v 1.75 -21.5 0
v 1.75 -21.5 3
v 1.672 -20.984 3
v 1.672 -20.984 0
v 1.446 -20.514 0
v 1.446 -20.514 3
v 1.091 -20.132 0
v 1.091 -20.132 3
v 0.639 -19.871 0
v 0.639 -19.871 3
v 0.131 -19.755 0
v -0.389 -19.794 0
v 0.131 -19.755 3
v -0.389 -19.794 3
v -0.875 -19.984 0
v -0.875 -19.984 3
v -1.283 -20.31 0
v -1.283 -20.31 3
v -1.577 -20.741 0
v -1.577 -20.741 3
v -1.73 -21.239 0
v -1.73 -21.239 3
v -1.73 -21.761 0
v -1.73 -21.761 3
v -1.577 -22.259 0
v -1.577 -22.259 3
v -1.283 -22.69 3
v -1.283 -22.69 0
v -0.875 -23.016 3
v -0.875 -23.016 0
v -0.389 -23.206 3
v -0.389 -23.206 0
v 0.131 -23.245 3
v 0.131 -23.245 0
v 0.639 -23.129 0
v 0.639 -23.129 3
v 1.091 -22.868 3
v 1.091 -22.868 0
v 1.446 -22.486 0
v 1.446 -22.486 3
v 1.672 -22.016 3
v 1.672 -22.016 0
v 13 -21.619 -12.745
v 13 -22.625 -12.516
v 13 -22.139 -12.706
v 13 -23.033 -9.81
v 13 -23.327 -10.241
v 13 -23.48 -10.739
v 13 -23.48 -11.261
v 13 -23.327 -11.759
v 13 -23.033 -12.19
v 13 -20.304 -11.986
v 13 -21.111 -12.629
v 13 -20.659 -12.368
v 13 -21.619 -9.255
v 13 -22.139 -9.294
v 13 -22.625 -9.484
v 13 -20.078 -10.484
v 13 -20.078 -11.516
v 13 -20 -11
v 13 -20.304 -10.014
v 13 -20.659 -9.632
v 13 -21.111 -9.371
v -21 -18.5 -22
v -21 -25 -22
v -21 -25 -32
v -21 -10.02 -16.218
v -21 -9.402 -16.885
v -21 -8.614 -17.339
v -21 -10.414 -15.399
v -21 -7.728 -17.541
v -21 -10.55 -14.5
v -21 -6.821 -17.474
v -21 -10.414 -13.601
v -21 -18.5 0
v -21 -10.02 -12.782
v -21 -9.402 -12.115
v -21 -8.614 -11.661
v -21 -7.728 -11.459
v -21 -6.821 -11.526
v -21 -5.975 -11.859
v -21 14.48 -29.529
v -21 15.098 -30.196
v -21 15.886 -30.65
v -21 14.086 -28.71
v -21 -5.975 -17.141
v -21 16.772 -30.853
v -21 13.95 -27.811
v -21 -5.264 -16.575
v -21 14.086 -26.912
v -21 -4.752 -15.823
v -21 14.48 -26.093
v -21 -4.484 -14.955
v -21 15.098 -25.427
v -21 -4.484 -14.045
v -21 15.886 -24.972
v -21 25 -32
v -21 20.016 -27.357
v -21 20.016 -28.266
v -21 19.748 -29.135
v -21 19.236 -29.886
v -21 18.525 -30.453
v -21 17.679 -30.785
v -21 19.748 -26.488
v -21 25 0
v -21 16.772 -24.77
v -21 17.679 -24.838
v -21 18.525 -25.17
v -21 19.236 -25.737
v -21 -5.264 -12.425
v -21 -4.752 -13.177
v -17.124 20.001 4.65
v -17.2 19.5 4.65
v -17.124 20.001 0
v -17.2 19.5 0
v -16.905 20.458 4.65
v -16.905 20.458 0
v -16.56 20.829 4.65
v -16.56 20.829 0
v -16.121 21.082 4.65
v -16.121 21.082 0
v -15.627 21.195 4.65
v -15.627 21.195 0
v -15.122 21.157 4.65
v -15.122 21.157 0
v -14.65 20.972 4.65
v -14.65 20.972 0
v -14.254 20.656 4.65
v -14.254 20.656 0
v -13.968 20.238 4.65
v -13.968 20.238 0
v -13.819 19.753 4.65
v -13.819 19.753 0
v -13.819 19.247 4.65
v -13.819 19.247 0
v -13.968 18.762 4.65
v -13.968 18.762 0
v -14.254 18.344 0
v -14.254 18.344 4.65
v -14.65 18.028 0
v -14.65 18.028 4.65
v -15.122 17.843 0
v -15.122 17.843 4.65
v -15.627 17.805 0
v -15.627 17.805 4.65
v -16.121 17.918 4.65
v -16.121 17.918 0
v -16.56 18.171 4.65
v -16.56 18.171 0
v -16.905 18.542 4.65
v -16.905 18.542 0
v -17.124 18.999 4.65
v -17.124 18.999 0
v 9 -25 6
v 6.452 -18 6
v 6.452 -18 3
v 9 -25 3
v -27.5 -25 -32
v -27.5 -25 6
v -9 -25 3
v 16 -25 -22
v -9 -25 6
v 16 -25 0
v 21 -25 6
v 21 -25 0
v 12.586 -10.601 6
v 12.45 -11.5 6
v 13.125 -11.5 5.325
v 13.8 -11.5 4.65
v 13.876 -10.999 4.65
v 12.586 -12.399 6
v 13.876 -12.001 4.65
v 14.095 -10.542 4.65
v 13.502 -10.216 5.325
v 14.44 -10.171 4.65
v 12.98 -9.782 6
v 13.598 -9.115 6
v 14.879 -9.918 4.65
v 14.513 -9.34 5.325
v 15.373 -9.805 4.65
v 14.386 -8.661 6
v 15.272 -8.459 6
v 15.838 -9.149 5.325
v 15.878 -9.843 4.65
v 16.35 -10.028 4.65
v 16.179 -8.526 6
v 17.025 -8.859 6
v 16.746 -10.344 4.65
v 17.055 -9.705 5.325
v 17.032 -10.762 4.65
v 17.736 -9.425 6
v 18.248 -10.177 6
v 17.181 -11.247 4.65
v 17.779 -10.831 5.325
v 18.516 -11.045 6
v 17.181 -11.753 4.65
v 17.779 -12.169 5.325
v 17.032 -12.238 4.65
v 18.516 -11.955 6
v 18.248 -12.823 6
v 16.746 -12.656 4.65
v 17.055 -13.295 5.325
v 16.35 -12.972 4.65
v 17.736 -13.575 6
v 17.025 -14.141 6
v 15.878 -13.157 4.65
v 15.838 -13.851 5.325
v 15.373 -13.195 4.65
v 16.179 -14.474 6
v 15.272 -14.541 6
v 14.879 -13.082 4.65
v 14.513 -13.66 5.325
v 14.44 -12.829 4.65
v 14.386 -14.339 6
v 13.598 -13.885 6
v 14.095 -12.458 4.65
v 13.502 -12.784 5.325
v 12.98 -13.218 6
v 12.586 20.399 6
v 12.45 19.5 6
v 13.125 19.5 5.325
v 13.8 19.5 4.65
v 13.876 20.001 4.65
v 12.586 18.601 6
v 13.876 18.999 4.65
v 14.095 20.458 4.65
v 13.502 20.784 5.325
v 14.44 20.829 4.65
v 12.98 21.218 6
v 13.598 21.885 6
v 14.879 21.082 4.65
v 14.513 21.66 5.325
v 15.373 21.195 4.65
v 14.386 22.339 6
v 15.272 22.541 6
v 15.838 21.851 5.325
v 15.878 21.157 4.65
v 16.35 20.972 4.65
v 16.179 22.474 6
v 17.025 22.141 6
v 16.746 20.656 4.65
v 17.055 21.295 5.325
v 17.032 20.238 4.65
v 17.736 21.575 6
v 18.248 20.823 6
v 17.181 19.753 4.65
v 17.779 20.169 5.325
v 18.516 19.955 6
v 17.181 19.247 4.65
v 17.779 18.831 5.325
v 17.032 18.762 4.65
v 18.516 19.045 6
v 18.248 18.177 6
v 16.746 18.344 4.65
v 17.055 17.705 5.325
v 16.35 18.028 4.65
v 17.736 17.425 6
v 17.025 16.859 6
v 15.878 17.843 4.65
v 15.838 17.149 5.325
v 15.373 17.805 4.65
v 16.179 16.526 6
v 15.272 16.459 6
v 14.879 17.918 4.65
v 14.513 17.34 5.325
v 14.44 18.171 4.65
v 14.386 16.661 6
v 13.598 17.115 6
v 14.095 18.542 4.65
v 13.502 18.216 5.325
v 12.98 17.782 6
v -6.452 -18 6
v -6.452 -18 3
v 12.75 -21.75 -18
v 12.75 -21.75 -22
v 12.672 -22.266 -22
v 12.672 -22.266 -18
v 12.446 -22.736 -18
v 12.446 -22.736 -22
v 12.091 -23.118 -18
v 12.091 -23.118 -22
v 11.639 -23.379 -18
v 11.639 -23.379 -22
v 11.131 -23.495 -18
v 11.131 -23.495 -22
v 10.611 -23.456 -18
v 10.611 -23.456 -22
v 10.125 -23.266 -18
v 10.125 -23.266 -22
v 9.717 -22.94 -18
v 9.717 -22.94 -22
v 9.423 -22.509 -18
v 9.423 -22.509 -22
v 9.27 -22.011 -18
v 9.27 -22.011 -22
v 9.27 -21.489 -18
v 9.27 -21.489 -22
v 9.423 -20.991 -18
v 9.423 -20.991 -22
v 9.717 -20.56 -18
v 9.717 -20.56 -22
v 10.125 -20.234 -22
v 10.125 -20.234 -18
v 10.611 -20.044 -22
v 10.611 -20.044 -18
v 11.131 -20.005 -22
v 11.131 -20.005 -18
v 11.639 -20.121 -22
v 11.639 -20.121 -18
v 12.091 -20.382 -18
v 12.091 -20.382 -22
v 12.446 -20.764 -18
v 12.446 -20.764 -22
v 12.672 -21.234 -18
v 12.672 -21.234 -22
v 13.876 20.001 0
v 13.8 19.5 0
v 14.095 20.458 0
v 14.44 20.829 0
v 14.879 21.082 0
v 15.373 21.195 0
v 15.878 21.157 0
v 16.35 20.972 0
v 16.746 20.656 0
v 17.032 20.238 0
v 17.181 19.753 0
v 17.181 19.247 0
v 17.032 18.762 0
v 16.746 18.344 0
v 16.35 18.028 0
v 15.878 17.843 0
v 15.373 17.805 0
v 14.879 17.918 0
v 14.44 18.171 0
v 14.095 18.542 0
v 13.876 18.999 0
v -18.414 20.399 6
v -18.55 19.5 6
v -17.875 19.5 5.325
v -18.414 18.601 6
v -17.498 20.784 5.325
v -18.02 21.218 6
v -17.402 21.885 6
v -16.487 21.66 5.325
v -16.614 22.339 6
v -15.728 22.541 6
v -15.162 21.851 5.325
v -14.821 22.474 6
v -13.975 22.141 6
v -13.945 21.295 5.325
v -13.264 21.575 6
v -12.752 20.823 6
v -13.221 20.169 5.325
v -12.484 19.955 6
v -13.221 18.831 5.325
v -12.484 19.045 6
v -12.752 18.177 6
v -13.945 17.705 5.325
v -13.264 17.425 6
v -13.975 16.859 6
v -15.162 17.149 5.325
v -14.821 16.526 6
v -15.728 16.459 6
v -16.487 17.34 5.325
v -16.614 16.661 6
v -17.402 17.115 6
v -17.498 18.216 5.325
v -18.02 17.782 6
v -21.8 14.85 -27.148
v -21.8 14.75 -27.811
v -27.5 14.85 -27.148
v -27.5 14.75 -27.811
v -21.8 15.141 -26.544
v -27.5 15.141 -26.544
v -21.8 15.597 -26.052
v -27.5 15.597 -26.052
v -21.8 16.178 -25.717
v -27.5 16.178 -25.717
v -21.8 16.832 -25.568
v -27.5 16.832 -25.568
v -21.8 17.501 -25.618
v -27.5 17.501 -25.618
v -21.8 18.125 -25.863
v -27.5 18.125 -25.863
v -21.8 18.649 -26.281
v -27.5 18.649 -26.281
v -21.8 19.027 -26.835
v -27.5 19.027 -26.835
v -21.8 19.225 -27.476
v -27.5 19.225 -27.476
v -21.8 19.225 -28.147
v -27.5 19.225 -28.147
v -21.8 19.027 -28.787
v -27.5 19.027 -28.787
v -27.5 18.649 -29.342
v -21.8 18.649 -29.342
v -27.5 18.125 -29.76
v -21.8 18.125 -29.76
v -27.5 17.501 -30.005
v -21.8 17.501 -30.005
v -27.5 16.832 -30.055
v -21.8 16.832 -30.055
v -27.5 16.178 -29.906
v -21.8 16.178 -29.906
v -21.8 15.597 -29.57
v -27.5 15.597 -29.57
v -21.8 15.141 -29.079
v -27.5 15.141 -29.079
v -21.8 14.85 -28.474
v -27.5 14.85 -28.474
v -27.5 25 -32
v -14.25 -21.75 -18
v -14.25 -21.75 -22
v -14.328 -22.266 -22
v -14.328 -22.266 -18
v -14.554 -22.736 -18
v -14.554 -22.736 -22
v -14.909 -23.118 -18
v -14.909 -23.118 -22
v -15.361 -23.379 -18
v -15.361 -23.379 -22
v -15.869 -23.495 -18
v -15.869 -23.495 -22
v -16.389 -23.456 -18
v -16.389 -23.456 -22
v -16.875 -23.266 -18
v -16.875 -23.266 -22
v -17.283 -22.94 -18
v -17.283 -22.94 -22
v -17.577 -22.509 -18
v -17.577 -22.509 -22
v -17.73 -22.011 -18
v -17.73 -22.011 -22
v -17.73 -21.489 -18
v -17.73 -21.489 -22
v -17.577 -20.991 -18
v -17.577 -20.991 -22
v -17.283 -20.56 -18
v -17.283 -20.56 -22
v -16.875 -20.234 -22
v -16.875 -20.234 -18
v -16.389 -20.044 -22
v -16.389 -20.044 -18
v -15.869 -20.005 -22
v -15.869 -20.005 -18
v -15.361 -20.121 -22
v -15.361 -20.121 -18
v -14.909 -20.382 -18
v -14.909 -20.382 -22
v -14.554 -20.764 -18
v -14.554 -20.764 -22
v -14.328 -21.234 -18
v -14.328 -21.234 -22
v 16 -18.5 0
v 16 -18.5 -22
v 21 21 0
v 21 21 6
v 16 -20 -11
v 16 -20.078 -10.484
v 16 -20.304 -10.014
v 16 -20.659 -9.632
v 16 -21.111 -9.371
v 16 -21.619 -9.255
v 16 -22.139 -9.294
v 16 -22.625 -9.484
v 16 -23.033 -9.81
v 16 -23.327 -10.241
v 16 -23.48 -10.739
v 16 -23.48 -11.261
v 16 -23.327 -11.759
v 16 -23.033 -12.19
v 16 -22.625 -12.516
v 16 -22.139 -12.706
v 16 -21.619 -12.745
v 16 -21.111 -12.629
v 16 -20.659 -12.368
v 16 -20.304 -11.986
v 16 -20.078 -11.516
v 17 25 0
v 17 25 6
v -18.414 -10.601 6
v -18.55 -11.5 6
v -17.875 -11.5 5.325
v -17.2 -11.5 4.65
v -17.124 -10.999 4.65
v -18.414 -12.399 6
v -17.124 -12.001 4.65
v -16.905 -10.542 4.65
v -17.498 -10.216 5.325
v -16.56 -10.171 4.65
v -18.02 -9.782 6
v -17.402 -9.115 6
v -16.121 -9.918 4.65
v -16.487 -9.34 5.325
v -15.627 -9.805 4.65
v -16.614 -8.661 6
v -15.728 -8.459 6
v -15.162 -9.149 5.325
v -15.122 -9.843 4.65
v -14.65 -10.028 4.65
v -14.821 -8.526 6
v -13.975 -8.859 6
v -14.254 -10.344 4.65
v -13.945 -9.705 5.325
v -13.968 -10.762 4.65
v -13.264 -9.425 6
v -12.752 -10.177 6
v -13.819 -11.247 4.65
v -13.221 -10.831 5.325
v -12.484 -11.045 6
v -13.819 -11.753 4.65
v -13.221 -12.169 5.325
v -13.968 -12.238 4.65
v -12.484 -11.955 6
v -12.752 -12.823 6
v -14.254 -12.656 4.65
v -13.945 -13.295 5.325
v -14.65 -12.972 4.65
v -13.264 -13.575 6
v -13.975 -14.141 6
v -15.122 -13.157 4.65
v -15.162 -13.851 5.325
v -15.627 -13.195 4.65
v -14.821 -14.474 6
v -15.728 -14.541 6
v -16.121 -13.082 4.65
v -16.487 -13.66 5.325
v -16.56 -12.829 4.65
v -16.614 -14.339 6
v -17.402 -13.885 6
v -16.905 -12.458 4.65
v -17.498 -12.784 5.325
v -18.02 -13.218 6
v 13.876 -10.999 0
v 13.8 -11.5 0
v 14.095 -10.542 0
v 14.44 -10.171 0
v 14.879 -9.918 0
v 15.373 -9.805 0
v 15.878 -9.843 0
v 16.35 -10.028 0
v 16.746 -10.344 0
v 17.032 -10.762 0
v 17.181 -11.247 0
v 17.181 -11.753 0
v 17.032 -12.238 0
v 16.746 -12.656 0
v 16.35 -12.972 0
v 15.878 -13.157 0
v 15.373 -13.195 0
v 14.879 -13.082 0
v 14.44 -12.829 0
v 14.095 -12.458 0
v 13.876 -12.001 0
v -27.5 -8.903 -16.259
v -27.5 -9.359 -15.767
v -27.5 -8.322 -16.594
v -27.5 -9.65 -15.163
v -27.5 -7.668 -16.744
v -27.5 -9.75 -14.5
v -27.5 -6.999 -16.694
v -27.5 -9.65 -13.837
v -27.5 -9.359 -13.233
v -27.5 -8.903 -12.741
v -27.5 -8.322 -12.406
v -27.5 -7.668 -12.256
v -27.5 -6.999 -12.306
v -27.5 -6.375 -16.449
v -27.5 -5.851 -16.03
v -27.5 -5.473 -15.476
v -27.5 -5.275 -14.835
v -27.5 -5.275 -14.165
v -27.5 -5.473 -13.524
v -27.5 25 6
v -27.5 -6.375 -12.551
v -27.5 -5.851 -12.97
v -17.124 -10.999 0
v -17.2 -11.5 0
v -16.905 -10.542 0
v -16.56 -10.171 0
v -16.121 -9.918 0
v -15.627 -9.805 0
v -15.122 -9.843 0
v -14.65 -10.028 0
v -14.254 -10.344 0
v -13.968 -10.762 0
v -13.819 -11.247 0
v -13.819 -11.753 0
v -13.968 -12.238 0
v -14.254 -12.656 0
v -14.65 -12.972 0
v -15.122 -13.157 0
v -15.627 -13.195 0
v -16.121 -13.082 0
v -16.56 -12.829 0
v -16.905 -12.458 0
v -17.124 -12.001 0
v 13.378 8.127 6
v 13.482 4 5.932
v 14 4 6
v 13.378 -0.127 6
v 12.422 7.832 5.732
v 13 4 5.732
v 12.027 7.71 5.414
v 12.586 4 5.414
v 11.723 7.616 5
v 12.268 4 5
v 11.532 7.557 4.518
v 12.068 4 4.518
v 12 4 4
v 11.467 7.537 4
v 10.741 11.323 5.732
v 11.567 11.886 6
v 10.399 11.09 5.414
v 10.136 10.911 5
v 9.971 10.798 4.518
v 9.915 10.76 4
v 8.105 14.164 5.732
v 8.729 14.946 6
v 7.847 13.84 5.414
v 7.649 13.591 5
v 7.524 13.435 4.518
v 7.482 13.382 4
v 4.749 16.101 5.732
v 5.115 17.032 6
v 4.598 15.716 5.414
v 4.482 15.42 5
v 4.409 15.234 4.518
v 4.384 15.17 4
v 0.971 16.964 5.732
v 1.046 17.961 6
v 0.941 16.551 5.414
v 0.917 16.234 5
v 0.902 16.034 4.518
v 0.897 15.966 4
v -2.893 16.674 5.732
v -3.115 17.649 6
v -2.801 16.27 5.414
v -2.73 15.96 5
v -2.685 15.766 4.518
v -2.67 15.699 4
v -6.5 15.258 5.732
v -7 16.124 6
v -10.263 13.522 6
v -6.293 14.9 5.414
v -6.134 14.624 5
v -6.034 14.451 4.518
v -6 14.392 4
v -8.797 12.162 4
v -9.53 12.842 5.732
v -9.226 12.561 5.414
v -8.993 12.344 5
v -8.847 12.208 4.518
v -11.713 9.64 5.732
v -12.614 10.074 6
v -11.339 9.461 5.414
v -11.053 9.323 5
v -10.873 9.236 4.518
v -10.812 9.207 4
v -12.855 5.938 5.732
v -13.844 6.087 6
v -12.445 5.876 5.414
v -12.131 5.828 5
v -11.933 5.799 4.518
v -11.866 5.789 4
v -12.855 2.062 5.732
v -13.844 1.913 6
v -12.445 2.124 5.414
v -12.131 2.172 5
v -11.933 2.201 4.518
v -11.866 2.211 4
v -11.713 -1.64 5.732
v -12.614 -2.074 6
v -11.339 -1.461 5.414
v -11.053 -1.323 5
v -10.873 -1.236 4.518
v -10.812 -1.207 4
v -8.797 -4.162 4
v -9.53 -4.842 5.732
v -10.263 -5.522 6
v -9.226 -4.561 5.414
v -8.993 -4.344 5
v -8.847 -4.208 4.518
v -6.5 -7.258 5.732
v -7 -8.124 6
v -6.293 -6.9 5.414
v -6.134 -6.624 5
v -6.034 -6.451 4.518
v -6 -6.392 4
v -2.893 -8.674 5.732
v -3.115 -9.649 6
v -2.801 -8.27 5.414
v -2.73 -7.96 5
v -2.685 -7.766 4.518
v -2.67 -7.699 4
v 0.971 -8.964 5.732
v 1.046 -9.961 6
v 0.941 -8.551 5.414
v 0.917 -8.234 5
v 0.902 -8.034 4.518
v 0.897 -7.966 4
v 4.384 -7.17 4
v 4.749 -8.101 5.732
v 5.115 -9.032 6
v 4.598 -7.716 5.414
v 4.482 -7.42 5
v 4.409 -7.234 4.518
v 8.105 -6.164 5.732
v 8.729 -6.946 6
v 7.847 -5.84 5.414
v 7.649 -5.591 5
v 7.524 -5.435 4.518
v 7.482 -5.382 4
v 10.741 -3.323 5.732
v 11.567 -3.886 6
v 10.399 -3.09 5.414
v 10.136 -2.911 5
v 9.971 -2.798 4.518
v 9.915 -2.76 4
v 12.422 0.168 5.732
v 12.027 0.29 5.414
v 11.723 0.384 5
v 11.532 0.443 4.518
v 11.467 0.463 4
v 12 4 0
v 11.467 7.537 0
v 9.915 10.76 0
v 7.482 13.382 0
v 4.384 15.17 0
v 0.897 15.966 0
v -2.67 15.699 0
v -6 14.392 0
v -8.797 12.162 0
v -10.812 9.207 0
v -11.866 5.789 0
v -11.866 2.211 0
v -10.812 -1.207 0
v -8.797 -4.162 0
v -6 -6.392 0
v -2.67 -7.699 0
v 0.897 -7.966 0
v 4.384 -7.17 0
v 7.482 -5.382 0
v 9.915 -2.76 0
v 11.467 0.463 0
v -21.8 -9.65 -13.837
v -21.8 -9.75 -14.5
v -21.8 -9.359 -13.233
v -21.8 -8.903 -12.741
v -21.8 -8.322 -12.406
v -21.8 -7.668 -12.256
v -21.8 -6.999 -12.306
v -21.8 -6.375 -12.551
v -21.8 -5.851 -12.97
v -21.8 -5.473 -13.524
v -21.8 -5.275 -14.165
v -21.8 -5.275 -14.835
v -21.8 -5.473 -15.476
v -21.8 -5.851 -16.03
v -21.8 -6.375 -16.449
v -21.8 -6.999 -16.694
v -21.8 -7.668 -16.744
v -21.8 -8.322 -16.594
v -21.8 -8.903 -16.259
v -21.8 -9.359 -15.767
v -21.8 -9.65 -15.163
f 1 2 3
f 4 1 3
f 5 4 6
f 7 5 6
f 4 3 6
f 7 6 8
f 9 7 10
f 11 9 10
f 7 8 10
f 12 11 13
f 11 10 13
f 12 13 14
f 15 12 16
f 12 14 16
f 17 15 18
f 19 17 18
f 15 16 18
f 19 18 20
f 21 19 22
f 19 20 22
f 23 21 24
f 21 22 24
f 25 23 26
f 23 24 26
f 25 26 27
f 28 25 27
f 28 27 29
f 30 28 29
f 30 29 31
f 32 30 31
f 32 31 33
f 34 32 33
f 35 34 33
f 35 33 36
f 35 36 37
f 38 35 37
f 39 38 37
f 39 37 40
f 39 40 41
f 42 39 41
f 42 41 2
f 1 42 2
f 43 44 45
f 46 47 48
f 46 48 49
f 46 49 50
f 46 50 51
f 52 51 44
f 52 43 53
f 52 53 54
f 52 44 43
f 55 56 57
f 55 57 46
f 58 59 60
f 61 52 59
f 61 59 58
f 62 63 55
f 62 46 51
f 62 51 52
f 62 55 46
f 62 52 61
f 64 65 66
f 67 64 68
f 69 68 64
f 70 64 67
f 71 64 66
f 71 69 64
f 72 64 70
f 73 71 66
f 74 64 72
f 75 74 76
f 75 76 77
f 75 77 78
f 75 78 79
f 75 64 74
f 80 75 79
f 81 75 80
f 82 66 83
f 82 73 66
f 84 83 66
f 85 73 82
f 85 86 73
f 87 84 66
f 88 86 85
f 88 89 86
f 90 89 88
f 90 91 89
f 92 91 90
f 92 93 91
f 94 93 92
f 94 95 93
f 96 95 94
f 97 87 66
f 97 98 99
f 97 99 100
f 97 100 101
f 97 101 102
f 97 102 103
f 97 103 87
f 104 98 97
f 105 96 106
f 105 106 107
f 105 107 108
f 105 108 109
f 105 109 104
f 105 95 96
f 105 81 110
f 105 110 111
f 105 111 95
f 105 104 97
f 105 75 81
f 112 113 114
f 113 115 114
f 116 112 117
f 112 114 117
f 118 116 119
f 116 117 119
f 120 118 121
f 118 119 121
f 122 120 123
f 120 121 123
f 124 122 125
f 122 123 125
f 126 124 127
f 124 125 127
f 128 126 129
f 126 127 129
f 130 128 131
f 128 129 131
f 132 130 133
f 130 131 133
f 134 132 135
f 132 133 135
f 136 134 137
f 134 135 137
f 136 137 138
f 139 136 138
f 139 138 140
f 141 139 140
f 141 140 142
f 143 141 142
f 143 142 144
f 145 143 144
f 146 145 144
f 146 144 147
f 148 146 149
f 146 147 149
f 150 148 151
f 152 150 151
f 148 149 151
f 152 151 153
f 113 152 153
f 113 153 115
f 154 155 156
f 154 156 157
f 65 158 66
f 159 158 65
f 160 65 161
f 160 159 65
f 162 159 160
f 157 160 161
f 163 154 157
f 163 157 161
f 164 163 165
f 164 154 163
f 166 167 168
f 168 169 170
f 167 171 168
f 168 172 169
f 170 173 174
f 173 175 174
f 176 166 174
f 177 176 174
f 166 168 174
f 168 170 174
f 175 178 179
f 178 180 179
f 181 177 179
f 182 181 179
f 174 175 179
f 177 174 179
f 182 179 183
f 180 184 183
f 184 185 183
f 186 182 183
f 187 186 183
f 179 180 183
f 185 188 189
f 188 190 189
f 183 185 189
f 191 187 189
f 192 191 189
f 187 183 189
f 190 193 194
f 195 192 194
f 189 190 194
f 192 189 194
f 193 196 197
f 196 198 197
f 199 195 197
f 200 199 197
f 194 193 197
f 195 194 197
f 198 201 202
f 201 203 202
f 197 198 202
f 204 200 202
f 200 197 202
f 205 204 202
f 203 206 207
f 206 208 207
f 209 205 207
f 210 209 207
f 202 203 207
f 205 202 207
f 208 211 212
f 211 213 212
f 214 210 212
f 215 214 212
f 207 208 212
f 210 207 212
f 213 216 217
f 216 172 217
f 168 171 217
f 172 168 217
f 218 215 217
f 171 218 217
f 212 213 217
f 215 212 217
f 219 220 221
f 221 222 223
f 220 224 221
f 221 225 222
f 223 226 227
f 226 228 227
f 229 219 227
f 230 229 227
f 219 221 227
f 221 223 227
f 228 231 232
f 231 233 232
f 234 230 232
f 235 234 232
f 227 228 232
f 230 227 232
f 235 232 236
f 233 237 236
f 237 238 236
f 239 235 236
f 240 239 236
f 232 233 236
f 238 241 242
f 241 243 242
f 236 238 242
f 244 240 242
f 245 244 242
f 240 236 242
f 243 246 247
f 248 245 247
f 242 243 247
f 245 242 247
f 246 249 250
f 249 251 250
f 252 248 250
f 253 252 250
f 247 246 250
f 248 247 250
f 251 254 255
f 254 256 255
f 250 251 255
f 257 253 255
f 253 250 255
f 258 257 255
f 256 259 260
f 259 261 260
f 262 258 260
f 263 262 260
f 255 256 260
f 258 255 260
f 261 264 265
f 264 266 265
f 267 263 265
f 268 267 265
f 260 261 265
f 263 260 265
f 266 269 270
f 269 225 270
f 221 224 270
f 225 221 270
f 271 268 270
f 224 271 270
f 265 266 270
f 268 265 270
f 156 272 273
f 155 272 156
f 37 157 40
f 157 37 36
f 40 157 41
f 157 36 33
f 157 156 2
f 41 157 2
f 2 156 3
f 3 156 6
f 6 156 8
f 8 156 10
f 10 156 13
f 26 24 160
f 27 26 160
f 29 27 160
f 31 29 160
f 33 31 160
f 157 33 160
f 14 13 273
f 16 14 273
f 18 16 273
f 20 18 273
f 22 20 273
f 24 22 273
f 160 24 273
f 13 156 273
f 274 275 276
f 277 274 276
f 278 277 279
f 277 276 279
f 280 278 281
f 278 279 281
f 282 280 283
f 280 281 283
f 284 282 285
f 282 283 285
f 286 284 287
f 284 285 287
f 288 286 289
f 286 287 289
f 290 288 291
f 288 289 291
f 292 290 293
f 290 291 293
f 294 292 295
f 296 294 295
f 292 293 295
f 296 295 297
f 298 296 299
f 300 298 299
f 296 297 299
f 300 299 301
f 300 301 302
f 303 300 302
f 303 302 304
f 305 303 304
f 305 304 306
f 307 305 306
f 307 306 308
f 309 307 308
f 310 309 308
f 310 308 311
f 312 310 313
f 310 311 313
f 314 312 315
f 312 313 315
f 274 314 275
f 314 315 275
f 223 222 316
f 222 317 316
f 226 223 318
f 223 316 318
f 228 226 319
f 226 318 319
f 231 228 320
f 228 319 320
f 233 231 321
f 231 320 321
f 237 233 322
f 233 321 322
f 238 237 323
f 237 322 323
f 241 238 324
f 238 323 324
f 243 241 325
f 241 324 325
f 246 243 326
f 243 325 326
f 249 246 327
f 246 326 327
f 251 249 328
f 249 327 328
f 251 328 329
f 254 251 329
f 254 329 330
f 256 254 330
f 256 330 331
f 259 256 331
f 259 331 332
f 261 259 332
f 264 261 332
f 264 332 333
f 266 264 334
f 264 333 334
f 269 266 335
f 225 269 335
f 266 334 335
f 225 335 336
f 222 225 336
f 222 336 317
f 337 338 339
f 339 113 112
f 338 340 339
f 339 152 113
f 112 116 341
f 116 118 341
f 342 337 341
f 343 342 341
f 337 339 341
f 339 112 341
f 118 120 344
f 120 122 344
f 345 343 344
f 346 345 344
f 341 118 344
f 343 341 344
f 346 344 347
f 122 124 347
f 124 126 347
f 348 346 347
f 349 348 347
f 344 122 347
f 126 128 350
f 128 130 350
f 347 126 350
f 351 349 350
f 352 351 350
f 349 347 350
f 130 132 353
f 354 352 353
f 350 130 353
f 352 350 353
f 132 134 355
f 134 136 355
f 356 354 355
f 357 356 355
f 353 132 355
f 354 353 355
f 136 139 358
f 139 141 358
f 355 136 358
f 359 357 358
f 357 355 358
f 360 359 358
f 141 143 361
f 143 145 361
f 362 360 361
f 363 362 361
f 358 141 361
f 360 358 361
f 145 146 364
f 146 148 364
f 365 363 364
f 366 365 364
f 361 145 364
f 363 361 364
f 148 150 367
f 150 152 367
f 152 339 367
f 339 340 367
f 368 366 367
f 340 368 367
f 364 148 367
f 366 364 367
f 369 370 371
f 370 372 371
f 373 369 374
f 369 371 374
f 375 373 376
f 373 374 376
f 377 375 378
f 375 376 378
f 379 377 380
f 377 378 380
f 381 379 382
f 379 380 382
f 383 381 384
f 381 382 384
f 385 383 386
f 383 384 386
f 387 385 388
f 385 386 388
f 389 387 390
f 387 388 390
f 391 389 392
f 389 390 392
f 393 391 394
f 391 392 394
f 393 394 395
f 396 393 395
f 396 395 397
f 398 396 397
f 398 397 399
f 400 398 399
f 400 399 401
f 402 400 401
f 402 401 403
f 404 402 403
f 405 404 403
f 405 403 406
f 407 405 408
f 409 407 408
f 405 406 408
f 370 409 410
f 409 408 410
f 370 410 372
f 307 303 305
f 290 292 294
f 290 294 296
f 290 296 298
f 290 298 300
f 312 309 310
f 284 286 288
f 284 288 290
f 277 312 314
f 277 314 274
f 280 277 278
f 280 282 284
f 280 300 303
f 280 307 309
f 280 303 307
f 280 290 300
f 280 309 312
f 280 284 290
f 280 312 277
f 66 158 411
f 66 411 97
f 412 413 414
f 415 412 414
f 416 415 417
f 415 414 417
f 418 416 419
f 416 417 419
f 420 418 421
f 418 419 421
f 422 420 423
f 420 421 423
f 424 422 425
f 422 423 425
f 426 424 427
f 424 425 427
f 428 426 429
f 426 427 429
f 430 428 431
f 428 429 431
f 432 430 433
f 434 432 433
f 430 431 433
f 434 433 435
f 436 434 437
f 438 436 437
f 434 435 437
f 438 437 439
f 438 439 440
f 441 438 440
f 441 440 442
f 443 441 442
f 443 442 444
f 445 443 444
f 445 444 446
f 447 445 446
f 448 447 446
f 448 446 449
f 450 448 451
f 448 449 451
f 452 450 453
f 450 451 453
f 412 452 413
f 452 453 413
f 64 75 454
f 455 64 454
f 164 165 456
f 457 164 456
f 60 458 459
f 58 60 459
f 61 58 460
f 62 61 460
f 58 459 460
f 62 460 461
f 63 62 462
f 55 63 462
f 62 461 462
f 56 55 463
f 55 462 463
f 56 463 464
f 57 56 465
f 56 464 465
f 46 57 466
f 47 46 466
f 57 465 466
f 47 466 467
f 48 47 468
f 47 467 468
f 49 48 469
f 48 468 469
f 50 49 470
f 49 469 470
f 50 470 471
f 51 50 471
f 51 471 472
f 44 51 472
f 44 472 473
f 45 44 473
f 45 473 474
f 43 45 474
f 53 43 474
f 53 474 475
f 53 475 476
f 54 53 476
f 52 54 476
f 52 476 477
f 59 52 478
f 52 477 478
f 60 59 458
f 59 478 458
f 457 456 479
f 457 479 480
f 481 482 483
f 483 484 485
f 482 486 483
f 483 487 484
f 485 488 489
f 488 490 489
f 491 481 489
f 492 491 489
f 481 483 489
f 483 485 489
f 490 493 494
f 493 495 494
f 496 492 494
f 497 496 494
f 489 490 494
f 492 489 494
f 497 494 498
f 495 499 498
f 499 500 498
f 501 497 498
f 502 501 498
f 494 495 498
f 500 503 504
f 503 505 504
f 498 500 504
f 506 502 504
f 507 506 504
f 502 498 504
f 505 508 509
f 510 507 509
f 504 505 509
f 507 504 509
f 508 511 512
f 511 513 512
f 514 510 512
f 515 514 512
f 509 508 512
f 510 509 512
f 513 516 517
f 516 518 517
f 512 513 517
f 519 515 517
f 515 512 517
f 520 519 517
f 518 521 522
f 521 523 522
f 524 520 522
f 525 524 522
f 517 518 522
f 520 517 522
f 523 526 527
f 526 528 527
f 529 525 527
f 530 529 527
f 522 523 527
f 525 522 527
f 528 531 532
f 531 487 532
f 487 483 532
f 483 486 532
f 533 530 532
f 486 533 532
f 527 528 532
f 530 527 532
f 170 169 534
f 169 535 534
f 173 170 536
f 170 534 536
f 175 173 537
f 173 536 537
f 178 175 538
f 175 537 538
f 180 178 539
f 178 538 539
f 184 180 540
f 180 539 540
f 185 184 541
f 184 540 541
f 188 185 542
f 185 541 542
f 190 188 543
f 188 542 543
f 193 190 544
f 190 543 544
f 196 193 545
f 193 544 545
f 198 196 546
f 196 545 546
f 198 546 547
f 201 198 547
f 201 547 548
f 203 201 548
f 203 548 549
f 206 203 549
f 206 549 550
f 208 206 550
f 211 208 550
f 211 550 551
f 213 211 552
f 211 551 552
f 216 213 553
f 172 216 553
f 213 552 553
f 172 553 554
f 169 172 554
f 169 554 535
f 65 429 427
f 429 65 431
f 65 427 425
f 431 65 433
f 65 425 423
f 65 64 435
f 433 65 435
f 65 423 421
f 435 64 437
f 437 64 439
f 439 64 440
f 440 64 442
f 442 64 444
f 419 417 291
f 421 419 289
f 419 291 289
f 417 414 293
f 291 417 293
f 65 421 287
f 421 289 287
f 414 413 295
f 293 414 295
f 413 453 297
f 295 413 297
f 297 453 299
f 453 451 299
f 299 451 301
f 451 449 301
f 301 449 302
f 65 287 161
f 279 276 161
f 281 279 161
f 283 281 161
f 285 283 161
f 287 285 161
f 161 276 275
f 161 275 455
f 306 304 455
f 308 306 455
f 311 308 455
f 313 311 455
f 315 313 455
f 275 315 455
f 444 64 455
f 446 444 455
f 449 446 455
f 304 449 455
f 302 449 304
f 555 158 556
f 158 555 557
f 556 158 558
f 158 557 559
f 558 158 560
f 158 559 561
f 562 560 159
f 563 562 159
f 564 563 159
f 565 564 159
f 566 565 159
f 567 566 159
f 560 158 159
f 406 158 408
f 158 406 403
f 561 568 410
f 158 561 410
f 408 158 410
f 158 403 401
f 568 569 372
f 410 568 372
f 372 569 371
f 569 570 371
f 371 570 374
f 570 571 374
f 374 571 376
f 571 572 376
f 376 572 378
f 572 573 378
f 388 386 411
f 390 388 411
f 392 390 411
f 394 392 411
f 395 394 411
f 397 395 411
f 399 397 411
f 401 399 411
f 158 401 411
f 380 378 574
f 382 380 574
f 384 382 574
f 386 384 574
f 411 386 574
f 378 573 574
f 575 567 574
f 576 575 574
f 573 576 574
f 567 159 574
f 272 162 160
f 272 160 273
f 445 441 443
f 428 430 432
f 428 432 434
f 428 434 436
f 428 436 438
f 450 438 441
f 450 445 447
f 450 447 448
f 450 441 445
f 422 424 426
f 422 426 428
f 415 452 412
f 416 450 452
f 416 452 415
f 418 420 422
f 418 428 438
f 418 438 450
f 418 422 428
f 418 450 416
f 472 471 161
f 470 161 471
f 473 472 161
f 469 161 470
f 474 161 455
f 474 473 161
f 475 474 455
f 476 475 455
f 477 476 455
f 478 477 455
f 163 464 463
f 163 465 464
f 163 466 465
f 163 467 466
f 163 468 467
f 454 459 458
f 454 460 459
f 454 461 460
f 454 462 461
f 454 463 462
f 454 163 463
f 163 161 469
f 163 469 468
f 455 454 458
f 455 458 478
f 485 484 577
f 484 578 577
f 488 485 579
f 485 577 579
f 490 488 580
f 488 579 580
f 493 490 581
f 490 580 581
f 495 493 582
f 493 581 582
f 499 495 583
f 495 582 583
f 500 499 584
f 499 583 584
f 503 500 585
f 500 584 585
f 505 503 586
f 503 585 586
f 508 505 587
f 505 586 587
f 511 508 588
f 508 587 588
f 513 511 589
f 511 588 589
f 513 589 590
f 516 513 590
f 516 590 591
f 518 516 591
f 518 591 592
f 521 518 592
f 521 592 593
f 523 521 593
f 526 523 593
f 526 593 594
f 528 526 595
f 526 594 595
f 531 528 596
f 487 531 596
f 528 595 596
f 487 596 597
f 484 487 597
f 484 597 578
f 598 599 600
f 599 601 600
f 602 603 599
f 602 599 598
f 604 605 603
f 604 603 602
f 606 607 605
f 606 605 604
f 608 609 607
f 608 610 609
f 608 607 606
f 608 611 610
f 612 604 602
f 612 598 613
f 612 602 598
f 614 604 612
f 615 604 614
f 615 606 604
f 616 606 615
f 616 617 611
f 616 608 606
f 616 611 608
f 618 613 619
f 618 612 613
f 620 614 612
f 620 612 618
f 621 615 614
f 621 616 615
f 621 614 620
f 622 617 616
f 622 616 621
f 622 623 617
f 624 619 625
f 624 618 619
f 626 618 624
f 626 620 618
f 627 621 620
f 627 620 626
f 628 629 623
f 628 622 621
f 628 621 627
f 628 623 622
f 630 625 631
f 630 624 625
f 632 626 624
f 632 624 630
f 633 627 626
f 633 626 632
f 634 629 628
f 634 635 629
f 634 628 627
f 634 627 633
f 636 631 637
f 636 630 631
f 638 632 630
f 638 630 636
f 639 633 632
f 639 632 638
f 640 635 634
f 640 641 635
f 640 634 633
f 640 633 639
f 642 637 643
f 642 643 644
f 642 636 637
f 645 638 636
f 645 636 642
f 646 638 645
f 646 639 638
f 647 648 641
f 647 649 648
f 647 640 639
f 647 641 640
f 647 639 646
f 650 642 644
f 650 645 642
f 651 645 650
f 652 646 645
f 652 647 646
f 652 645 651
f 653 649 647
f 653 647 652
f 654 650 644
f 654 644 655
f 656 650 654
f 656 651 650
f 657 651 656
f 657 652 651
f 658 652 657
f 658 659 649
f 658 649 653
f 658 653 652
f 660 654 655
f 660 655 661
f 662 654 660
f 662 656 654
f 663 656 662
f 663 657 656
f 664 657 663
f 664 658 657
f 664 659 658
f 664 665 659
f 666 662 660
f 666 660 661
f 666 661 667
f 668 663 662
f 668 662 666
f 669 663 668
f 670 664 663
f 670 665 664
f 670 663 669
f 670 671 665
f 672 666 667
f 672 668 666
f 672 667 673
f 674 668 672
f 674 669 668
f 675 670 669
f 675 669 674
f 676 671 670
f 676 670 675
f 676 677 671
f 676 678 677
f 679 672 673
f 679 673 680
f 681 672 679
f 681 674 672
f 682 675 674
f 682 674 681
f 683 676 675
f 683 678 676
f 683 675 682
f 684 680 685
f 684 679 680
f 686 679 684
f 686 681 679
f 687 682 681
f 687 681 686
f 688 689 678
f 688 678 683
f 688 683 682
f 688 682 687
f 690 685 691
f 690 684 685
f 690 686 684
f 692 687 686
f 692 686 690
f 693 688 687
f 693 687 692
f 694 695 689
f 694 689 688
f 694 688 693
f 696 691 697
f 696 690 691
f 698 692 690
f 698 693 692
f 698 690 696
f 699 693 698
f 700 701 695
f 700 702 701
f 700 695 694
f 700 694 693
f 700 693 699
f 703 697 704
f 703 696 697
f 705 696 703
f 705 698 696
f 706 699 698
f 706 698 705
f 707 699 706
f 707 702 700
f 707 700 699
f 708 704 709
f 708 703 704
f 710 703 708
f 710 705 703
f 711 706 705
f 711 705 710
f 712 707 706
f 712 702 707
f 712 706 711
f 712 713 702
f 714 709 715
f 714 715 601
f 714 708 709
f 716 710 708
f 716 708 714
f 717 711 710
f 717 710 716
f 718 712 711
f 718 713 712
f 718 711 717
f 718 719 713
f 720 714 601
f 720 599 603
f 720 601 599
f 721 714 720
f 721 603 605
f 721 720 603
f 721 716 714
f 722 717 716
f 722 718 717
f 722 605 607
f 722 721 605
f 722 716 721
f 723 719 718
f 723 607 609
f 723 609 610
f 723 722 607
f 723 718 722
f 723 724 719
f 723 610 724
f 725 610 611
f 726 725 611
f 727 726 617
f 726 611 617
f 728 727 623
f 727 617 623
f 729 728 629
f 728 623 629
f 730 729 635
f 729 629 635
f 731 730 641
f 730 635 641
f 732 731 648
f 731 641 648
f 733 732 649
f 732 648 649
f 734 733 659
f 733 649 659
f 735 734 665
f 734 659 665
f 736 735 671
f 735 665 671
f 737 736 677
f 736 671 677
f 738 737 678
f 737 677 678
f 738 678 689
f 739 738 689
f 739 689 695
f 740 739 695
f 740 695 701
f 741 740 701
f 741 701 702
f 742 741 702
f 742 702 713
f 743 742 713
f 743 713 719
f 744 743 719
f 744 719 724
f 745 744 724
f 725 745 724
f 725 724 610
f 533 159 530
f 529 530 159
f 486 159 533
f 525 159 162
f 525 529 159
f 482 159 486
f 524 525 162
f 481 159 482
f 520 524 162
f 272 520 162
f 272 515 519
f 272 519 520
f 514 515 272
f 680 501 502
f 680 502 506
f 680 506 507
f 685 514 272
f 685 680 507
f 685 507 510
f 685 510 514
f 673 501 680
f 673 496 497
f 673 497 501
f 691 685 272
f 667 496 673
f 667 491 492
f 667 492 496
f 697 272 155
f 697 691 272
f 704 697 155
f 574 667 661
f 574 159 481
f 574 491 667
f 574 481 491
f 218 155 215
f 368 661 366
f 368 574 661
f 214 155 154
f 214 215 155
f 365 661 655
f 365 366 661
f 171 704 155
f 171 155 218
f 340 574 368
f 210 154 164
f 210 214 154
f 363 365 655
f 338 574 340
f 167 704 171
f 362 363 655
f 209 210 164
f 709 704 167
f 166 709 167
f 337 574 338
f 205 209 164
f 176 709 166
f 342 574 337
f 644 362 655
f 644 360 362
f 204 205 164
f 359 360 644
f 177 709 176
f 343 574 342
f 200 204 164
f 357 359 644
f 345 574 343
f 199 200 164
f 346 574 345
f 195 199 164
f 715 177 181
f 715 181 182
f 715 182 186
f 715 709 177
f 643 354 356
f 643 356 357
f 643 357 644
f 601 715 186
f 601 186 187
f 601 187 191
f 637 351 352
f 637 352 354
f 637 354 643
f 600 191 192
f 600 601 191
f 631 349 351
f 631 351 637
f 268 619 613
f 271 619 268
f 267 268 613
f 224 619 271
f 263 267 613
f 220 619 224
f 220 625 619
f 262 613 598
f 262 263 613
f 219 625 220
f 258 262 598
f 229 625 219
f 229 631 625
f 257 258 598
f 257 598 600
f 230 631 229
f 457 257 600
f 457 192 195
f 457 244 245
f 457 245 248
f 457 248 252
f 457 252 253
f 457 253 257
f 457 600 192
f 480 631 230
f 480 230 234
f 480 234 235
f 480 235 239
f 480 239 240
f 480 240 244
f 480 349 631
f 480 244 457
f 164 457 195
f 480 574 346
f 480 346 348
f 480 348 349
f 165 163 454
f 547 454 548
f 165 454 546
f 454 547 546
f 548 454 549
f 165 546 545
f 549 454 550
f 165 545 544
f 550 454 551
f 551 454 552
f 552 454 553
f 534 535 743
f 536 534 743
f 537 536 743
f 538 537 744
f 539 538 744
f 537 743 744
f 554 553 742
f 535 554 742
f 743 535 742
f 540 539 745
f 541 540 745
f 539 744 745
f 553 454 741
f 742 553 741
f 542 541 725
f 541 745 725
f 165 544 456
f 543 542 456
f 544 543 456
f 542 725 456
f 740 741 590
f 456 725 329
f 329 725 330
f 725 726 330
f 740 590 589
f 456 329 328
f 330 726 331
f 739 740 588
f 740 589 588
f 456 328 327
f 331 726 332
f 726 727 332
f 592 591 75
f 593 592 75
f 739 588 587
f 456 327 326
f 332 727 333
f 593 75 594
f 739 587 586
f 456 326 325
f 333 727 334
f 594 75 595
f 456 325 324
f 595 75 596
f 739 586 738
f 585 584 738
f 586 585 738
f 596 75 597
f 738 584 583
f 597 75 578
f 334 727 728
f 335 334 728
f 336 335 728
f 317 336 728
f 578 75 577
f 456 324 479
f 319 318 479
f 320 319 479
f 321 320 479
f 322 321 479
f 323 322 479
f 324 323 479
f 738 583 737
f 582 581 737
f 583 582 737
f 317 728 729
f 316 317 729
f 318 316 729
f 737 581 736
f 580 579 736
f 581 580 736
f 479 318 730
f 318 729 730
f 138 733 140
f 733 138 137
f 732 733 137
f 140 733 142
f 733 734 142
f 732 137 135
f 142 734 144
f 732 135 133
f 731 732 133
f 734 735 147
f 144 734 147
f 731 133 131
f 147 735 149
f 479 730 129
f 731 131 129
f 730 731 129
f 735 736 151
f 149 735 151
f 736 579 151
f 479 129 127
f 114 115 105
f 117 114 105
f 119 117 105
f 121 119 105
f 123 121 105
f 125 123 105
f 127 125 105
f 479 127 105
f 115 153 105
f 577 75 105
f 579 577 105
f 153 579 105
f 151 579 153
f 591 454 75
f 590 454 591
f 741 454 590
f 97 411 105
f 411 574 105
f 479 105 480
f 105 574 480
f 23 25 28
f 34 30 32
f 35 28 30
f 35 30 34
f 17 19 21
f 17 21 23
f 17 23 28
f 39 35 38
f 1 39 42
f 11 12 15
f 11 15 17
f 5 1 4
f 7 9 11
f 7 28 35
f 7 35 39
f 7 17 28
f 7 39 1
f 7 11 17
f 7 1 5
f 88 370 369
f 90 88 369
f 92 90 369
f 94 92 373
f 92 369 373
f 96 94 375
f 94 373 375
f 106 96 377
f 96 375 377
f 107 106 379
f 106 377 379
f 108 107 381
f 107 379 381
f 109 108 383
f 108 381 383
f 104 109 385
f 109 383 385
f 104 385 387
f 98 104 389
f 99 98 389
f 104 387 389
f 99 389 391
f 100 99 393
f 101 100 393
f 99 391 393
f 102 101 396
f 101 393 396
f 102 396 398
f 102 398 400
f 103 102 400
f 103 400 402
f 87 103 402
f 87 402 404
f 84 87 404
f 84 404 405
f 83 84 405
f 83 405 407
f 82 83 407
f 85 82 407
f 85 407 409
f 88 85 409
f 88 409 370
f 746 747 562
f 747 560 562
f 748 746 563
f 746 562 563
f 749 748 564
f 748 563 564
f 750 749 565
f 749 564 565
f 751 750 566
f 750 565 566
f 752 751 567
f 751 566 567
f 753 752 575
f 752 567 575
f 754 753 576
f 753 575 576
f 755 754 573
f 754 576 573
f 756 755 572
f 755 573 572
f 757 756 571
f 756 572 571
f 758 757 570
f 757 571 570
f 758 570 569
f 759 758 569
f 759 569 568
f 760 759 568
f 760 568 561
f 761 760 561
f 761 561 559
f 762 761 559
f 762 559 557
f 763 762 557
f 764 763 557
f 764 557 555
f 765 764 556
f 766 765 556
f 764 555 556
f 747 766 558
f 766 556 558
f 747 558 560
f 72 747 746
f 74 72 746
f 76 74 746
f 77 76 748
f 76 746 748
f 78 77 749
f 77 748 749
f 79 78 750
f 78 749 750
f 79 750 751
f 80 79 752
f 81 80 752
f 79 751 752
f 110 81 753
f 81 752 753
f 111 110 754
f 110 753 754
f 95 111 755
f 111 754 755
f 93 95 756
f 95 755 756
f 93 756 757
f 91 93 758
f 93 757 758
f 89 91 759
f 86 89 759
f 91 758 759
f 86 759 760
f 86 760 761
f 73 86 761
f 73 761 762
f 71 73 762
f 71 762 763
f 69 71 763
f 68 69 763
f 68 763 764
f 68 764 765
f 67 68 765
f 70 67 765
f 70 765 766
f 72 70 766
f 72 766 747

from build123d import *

# Parameters (mm, degrees)
SKETCH028_W         = 6.5
SKETCH028_H         = 50
PAD010_DEPTH        = 6
PAD010_DEPTH_BACK   = 32
HOLE011_D           = 4.5
HOLE011_DEPTH       = 25
HOLE011_CSINK_D     = 6.1
HOLE011_CSINK_ANGLE = 90
SKETCH_W            = 37
SKETCH_H            = 6.5
PAD_DEPTH           = 22
SKETCH041_R         = 1.75
POCKET_DEPTH        = 4
SKETCH042_R         = 1.75
POCKET014_DEPTH     = 3
BINDER016_W         = 50
BINDER016_H         = 42
PAD009_DEPTH        = 6
HOLE007_D           = 3.4
HOLE007_CSINK_D     = 6.1
HOLE007_CSINK_ANGLE = 90
SKETCH030_R         = 12
POCKET008_DEPTH     = 6.001
FILLET003_R         = 2
POCKET012_DEPTH     = 3
SKETCH040_R         = 1.75
POCKET013_DEPTH     = 3.001
CHAMFER_SIZE        = 4


with BuildPart() as mh002:
    # Sketch028 (on Face1 of Binder017) → Pad010 (new body, two sides)
    with BuildSketch(Plane.XY) as pad010_sk:
        with Locations((-24.25, 0)):
            Rectangle(SKETCH028_W, SKETCH028_H)
    extrude(amount=PAD010_DEPTH)
    extrude(pad010_sk.sketch, amount=-PAD010_DEPTH_BACK)

    # Hole011
    with Locations(Plane(origin=(-21, 25, -2), x_dir=(0, 1, 0), z_dir=(1, 0, 0))):
        with Locations((-32.5, -12.5), (-8, -25.81125)):
            CounterSinkHole(HOLE011_D / 2, HOLE011_CSINK_D / 2, depth=HOLE011_DEPTH, counter_sink_angle=HOLE011_CSINK_ANGLE)


with BuildPart() as mh003:
    # Sketch (on Face1 of Binder) → Pad (new body)
    with BuildSketch(Plane.XY):
        with Locations((-2.5, -21.75)):
            Rectangle(SKETCH_W, SKETCH_H)
    extrude(amount=-PAD_DEPTH)

    # Sketch041 (on Face6 of Pad) → Pocket (cut)
    with BuildSketch(Plane(origin=(0, 0, -22), x_dir=(1, 0, 0), z_dir=(0, 0, -1))):
        with Locations((-16, 21.75)):
            Circle(SKETCH041_R)
        with Locations((11, 21.75)):
            Circle(SKETCH041_R)
    extrude(amount=-POCKET_DEPTH, mode=Mode.SUBTRACT)

    # Sketch042 (on Face6 of Pocket) → Pocket014 (cut)
    with BuildSketch(Plane.YZ.offset(16)):
        with Locations((-21.75, -11)):
            Circle(SKETCH042_R)
    extrude(amount=-POCKET014_DEPTH, mode=Mode.SUBTRACT)


with BuildPart() as mhf001:
    # Binder016 → Pad009 (new body)
    with BuildSketch(Plane(origin=(0, 0, 0), x_dir=(0, 1, 0), z_dir=(0, 0, 1))):
        Rectangle(BINDER016_W, BINDER016_H)
    extrude(amount=PAD009_DEPTH)

    # Hole007 (through all)
    with Locations(Plane.XY.offset(6)):
        with Locations((-15.5, 19.5), (-15.5, -11.5), (15.5, -11.5), (15.5, 19.5)):
            CounterSinkHole(HOLE007_D / 2, HOLE007_CSINK_D / 2, counter_sink_angle=HOLE007_CSINK_ANGLE)

    # Sketch030 (on Face5 of Hole007) → Pocket008 (cut, through all)
    with BuildSketch(Plane.XY.offset(6)):
        with Locations((0, 4)):
            Circle(SKETCH030_R)
    extrude(amount=-POCKET008_DEPTH, mode=Mode.SUBTRACT)

    # Fillet003
    fillet003_edges = [mhf001.edges().sort_by_distance(p)[0] for p in [
        (-12, 4, 6),
    ]]
    fillet(fillet003_edges, radius=FILLET003_R)

    # Sketch031 (on Face1 of Fillet003) → Pocket012 (cut)
    with BuildSketch(Plane.XY.offset(6)):
        Polygon((-9, -25), (-6.452208, -18), (6.452208, -18), (9, -25), align=None)
    extrude(amount=-POCKET012_DEPTH, mode=Mode.SUBTRACT)

    # Sketch040 (on Face15 of Pocket012) → Pocket013 (cut, through all)
    with BuildSketch(Plane.XY.offset(3)):
        with Locations((0, -21.5)):
            Circle(SKETCH040_R)
    extrude(amount=-POCKET013_DEPTH, mode=Mode.SUBTRACT)

    # Chamfer
    chamfer_edges = [mhf001.edges().sort_by_distance(p)[0] for p in [
        (21, 25, 3),
    ]]
    chamfer(chamfer_edges, length=CHAMFER_SIZE)

    # Fusion: union MH002, MH003
    add(mh002.part)
    add(mh003.part)


solid = mhf001.part
